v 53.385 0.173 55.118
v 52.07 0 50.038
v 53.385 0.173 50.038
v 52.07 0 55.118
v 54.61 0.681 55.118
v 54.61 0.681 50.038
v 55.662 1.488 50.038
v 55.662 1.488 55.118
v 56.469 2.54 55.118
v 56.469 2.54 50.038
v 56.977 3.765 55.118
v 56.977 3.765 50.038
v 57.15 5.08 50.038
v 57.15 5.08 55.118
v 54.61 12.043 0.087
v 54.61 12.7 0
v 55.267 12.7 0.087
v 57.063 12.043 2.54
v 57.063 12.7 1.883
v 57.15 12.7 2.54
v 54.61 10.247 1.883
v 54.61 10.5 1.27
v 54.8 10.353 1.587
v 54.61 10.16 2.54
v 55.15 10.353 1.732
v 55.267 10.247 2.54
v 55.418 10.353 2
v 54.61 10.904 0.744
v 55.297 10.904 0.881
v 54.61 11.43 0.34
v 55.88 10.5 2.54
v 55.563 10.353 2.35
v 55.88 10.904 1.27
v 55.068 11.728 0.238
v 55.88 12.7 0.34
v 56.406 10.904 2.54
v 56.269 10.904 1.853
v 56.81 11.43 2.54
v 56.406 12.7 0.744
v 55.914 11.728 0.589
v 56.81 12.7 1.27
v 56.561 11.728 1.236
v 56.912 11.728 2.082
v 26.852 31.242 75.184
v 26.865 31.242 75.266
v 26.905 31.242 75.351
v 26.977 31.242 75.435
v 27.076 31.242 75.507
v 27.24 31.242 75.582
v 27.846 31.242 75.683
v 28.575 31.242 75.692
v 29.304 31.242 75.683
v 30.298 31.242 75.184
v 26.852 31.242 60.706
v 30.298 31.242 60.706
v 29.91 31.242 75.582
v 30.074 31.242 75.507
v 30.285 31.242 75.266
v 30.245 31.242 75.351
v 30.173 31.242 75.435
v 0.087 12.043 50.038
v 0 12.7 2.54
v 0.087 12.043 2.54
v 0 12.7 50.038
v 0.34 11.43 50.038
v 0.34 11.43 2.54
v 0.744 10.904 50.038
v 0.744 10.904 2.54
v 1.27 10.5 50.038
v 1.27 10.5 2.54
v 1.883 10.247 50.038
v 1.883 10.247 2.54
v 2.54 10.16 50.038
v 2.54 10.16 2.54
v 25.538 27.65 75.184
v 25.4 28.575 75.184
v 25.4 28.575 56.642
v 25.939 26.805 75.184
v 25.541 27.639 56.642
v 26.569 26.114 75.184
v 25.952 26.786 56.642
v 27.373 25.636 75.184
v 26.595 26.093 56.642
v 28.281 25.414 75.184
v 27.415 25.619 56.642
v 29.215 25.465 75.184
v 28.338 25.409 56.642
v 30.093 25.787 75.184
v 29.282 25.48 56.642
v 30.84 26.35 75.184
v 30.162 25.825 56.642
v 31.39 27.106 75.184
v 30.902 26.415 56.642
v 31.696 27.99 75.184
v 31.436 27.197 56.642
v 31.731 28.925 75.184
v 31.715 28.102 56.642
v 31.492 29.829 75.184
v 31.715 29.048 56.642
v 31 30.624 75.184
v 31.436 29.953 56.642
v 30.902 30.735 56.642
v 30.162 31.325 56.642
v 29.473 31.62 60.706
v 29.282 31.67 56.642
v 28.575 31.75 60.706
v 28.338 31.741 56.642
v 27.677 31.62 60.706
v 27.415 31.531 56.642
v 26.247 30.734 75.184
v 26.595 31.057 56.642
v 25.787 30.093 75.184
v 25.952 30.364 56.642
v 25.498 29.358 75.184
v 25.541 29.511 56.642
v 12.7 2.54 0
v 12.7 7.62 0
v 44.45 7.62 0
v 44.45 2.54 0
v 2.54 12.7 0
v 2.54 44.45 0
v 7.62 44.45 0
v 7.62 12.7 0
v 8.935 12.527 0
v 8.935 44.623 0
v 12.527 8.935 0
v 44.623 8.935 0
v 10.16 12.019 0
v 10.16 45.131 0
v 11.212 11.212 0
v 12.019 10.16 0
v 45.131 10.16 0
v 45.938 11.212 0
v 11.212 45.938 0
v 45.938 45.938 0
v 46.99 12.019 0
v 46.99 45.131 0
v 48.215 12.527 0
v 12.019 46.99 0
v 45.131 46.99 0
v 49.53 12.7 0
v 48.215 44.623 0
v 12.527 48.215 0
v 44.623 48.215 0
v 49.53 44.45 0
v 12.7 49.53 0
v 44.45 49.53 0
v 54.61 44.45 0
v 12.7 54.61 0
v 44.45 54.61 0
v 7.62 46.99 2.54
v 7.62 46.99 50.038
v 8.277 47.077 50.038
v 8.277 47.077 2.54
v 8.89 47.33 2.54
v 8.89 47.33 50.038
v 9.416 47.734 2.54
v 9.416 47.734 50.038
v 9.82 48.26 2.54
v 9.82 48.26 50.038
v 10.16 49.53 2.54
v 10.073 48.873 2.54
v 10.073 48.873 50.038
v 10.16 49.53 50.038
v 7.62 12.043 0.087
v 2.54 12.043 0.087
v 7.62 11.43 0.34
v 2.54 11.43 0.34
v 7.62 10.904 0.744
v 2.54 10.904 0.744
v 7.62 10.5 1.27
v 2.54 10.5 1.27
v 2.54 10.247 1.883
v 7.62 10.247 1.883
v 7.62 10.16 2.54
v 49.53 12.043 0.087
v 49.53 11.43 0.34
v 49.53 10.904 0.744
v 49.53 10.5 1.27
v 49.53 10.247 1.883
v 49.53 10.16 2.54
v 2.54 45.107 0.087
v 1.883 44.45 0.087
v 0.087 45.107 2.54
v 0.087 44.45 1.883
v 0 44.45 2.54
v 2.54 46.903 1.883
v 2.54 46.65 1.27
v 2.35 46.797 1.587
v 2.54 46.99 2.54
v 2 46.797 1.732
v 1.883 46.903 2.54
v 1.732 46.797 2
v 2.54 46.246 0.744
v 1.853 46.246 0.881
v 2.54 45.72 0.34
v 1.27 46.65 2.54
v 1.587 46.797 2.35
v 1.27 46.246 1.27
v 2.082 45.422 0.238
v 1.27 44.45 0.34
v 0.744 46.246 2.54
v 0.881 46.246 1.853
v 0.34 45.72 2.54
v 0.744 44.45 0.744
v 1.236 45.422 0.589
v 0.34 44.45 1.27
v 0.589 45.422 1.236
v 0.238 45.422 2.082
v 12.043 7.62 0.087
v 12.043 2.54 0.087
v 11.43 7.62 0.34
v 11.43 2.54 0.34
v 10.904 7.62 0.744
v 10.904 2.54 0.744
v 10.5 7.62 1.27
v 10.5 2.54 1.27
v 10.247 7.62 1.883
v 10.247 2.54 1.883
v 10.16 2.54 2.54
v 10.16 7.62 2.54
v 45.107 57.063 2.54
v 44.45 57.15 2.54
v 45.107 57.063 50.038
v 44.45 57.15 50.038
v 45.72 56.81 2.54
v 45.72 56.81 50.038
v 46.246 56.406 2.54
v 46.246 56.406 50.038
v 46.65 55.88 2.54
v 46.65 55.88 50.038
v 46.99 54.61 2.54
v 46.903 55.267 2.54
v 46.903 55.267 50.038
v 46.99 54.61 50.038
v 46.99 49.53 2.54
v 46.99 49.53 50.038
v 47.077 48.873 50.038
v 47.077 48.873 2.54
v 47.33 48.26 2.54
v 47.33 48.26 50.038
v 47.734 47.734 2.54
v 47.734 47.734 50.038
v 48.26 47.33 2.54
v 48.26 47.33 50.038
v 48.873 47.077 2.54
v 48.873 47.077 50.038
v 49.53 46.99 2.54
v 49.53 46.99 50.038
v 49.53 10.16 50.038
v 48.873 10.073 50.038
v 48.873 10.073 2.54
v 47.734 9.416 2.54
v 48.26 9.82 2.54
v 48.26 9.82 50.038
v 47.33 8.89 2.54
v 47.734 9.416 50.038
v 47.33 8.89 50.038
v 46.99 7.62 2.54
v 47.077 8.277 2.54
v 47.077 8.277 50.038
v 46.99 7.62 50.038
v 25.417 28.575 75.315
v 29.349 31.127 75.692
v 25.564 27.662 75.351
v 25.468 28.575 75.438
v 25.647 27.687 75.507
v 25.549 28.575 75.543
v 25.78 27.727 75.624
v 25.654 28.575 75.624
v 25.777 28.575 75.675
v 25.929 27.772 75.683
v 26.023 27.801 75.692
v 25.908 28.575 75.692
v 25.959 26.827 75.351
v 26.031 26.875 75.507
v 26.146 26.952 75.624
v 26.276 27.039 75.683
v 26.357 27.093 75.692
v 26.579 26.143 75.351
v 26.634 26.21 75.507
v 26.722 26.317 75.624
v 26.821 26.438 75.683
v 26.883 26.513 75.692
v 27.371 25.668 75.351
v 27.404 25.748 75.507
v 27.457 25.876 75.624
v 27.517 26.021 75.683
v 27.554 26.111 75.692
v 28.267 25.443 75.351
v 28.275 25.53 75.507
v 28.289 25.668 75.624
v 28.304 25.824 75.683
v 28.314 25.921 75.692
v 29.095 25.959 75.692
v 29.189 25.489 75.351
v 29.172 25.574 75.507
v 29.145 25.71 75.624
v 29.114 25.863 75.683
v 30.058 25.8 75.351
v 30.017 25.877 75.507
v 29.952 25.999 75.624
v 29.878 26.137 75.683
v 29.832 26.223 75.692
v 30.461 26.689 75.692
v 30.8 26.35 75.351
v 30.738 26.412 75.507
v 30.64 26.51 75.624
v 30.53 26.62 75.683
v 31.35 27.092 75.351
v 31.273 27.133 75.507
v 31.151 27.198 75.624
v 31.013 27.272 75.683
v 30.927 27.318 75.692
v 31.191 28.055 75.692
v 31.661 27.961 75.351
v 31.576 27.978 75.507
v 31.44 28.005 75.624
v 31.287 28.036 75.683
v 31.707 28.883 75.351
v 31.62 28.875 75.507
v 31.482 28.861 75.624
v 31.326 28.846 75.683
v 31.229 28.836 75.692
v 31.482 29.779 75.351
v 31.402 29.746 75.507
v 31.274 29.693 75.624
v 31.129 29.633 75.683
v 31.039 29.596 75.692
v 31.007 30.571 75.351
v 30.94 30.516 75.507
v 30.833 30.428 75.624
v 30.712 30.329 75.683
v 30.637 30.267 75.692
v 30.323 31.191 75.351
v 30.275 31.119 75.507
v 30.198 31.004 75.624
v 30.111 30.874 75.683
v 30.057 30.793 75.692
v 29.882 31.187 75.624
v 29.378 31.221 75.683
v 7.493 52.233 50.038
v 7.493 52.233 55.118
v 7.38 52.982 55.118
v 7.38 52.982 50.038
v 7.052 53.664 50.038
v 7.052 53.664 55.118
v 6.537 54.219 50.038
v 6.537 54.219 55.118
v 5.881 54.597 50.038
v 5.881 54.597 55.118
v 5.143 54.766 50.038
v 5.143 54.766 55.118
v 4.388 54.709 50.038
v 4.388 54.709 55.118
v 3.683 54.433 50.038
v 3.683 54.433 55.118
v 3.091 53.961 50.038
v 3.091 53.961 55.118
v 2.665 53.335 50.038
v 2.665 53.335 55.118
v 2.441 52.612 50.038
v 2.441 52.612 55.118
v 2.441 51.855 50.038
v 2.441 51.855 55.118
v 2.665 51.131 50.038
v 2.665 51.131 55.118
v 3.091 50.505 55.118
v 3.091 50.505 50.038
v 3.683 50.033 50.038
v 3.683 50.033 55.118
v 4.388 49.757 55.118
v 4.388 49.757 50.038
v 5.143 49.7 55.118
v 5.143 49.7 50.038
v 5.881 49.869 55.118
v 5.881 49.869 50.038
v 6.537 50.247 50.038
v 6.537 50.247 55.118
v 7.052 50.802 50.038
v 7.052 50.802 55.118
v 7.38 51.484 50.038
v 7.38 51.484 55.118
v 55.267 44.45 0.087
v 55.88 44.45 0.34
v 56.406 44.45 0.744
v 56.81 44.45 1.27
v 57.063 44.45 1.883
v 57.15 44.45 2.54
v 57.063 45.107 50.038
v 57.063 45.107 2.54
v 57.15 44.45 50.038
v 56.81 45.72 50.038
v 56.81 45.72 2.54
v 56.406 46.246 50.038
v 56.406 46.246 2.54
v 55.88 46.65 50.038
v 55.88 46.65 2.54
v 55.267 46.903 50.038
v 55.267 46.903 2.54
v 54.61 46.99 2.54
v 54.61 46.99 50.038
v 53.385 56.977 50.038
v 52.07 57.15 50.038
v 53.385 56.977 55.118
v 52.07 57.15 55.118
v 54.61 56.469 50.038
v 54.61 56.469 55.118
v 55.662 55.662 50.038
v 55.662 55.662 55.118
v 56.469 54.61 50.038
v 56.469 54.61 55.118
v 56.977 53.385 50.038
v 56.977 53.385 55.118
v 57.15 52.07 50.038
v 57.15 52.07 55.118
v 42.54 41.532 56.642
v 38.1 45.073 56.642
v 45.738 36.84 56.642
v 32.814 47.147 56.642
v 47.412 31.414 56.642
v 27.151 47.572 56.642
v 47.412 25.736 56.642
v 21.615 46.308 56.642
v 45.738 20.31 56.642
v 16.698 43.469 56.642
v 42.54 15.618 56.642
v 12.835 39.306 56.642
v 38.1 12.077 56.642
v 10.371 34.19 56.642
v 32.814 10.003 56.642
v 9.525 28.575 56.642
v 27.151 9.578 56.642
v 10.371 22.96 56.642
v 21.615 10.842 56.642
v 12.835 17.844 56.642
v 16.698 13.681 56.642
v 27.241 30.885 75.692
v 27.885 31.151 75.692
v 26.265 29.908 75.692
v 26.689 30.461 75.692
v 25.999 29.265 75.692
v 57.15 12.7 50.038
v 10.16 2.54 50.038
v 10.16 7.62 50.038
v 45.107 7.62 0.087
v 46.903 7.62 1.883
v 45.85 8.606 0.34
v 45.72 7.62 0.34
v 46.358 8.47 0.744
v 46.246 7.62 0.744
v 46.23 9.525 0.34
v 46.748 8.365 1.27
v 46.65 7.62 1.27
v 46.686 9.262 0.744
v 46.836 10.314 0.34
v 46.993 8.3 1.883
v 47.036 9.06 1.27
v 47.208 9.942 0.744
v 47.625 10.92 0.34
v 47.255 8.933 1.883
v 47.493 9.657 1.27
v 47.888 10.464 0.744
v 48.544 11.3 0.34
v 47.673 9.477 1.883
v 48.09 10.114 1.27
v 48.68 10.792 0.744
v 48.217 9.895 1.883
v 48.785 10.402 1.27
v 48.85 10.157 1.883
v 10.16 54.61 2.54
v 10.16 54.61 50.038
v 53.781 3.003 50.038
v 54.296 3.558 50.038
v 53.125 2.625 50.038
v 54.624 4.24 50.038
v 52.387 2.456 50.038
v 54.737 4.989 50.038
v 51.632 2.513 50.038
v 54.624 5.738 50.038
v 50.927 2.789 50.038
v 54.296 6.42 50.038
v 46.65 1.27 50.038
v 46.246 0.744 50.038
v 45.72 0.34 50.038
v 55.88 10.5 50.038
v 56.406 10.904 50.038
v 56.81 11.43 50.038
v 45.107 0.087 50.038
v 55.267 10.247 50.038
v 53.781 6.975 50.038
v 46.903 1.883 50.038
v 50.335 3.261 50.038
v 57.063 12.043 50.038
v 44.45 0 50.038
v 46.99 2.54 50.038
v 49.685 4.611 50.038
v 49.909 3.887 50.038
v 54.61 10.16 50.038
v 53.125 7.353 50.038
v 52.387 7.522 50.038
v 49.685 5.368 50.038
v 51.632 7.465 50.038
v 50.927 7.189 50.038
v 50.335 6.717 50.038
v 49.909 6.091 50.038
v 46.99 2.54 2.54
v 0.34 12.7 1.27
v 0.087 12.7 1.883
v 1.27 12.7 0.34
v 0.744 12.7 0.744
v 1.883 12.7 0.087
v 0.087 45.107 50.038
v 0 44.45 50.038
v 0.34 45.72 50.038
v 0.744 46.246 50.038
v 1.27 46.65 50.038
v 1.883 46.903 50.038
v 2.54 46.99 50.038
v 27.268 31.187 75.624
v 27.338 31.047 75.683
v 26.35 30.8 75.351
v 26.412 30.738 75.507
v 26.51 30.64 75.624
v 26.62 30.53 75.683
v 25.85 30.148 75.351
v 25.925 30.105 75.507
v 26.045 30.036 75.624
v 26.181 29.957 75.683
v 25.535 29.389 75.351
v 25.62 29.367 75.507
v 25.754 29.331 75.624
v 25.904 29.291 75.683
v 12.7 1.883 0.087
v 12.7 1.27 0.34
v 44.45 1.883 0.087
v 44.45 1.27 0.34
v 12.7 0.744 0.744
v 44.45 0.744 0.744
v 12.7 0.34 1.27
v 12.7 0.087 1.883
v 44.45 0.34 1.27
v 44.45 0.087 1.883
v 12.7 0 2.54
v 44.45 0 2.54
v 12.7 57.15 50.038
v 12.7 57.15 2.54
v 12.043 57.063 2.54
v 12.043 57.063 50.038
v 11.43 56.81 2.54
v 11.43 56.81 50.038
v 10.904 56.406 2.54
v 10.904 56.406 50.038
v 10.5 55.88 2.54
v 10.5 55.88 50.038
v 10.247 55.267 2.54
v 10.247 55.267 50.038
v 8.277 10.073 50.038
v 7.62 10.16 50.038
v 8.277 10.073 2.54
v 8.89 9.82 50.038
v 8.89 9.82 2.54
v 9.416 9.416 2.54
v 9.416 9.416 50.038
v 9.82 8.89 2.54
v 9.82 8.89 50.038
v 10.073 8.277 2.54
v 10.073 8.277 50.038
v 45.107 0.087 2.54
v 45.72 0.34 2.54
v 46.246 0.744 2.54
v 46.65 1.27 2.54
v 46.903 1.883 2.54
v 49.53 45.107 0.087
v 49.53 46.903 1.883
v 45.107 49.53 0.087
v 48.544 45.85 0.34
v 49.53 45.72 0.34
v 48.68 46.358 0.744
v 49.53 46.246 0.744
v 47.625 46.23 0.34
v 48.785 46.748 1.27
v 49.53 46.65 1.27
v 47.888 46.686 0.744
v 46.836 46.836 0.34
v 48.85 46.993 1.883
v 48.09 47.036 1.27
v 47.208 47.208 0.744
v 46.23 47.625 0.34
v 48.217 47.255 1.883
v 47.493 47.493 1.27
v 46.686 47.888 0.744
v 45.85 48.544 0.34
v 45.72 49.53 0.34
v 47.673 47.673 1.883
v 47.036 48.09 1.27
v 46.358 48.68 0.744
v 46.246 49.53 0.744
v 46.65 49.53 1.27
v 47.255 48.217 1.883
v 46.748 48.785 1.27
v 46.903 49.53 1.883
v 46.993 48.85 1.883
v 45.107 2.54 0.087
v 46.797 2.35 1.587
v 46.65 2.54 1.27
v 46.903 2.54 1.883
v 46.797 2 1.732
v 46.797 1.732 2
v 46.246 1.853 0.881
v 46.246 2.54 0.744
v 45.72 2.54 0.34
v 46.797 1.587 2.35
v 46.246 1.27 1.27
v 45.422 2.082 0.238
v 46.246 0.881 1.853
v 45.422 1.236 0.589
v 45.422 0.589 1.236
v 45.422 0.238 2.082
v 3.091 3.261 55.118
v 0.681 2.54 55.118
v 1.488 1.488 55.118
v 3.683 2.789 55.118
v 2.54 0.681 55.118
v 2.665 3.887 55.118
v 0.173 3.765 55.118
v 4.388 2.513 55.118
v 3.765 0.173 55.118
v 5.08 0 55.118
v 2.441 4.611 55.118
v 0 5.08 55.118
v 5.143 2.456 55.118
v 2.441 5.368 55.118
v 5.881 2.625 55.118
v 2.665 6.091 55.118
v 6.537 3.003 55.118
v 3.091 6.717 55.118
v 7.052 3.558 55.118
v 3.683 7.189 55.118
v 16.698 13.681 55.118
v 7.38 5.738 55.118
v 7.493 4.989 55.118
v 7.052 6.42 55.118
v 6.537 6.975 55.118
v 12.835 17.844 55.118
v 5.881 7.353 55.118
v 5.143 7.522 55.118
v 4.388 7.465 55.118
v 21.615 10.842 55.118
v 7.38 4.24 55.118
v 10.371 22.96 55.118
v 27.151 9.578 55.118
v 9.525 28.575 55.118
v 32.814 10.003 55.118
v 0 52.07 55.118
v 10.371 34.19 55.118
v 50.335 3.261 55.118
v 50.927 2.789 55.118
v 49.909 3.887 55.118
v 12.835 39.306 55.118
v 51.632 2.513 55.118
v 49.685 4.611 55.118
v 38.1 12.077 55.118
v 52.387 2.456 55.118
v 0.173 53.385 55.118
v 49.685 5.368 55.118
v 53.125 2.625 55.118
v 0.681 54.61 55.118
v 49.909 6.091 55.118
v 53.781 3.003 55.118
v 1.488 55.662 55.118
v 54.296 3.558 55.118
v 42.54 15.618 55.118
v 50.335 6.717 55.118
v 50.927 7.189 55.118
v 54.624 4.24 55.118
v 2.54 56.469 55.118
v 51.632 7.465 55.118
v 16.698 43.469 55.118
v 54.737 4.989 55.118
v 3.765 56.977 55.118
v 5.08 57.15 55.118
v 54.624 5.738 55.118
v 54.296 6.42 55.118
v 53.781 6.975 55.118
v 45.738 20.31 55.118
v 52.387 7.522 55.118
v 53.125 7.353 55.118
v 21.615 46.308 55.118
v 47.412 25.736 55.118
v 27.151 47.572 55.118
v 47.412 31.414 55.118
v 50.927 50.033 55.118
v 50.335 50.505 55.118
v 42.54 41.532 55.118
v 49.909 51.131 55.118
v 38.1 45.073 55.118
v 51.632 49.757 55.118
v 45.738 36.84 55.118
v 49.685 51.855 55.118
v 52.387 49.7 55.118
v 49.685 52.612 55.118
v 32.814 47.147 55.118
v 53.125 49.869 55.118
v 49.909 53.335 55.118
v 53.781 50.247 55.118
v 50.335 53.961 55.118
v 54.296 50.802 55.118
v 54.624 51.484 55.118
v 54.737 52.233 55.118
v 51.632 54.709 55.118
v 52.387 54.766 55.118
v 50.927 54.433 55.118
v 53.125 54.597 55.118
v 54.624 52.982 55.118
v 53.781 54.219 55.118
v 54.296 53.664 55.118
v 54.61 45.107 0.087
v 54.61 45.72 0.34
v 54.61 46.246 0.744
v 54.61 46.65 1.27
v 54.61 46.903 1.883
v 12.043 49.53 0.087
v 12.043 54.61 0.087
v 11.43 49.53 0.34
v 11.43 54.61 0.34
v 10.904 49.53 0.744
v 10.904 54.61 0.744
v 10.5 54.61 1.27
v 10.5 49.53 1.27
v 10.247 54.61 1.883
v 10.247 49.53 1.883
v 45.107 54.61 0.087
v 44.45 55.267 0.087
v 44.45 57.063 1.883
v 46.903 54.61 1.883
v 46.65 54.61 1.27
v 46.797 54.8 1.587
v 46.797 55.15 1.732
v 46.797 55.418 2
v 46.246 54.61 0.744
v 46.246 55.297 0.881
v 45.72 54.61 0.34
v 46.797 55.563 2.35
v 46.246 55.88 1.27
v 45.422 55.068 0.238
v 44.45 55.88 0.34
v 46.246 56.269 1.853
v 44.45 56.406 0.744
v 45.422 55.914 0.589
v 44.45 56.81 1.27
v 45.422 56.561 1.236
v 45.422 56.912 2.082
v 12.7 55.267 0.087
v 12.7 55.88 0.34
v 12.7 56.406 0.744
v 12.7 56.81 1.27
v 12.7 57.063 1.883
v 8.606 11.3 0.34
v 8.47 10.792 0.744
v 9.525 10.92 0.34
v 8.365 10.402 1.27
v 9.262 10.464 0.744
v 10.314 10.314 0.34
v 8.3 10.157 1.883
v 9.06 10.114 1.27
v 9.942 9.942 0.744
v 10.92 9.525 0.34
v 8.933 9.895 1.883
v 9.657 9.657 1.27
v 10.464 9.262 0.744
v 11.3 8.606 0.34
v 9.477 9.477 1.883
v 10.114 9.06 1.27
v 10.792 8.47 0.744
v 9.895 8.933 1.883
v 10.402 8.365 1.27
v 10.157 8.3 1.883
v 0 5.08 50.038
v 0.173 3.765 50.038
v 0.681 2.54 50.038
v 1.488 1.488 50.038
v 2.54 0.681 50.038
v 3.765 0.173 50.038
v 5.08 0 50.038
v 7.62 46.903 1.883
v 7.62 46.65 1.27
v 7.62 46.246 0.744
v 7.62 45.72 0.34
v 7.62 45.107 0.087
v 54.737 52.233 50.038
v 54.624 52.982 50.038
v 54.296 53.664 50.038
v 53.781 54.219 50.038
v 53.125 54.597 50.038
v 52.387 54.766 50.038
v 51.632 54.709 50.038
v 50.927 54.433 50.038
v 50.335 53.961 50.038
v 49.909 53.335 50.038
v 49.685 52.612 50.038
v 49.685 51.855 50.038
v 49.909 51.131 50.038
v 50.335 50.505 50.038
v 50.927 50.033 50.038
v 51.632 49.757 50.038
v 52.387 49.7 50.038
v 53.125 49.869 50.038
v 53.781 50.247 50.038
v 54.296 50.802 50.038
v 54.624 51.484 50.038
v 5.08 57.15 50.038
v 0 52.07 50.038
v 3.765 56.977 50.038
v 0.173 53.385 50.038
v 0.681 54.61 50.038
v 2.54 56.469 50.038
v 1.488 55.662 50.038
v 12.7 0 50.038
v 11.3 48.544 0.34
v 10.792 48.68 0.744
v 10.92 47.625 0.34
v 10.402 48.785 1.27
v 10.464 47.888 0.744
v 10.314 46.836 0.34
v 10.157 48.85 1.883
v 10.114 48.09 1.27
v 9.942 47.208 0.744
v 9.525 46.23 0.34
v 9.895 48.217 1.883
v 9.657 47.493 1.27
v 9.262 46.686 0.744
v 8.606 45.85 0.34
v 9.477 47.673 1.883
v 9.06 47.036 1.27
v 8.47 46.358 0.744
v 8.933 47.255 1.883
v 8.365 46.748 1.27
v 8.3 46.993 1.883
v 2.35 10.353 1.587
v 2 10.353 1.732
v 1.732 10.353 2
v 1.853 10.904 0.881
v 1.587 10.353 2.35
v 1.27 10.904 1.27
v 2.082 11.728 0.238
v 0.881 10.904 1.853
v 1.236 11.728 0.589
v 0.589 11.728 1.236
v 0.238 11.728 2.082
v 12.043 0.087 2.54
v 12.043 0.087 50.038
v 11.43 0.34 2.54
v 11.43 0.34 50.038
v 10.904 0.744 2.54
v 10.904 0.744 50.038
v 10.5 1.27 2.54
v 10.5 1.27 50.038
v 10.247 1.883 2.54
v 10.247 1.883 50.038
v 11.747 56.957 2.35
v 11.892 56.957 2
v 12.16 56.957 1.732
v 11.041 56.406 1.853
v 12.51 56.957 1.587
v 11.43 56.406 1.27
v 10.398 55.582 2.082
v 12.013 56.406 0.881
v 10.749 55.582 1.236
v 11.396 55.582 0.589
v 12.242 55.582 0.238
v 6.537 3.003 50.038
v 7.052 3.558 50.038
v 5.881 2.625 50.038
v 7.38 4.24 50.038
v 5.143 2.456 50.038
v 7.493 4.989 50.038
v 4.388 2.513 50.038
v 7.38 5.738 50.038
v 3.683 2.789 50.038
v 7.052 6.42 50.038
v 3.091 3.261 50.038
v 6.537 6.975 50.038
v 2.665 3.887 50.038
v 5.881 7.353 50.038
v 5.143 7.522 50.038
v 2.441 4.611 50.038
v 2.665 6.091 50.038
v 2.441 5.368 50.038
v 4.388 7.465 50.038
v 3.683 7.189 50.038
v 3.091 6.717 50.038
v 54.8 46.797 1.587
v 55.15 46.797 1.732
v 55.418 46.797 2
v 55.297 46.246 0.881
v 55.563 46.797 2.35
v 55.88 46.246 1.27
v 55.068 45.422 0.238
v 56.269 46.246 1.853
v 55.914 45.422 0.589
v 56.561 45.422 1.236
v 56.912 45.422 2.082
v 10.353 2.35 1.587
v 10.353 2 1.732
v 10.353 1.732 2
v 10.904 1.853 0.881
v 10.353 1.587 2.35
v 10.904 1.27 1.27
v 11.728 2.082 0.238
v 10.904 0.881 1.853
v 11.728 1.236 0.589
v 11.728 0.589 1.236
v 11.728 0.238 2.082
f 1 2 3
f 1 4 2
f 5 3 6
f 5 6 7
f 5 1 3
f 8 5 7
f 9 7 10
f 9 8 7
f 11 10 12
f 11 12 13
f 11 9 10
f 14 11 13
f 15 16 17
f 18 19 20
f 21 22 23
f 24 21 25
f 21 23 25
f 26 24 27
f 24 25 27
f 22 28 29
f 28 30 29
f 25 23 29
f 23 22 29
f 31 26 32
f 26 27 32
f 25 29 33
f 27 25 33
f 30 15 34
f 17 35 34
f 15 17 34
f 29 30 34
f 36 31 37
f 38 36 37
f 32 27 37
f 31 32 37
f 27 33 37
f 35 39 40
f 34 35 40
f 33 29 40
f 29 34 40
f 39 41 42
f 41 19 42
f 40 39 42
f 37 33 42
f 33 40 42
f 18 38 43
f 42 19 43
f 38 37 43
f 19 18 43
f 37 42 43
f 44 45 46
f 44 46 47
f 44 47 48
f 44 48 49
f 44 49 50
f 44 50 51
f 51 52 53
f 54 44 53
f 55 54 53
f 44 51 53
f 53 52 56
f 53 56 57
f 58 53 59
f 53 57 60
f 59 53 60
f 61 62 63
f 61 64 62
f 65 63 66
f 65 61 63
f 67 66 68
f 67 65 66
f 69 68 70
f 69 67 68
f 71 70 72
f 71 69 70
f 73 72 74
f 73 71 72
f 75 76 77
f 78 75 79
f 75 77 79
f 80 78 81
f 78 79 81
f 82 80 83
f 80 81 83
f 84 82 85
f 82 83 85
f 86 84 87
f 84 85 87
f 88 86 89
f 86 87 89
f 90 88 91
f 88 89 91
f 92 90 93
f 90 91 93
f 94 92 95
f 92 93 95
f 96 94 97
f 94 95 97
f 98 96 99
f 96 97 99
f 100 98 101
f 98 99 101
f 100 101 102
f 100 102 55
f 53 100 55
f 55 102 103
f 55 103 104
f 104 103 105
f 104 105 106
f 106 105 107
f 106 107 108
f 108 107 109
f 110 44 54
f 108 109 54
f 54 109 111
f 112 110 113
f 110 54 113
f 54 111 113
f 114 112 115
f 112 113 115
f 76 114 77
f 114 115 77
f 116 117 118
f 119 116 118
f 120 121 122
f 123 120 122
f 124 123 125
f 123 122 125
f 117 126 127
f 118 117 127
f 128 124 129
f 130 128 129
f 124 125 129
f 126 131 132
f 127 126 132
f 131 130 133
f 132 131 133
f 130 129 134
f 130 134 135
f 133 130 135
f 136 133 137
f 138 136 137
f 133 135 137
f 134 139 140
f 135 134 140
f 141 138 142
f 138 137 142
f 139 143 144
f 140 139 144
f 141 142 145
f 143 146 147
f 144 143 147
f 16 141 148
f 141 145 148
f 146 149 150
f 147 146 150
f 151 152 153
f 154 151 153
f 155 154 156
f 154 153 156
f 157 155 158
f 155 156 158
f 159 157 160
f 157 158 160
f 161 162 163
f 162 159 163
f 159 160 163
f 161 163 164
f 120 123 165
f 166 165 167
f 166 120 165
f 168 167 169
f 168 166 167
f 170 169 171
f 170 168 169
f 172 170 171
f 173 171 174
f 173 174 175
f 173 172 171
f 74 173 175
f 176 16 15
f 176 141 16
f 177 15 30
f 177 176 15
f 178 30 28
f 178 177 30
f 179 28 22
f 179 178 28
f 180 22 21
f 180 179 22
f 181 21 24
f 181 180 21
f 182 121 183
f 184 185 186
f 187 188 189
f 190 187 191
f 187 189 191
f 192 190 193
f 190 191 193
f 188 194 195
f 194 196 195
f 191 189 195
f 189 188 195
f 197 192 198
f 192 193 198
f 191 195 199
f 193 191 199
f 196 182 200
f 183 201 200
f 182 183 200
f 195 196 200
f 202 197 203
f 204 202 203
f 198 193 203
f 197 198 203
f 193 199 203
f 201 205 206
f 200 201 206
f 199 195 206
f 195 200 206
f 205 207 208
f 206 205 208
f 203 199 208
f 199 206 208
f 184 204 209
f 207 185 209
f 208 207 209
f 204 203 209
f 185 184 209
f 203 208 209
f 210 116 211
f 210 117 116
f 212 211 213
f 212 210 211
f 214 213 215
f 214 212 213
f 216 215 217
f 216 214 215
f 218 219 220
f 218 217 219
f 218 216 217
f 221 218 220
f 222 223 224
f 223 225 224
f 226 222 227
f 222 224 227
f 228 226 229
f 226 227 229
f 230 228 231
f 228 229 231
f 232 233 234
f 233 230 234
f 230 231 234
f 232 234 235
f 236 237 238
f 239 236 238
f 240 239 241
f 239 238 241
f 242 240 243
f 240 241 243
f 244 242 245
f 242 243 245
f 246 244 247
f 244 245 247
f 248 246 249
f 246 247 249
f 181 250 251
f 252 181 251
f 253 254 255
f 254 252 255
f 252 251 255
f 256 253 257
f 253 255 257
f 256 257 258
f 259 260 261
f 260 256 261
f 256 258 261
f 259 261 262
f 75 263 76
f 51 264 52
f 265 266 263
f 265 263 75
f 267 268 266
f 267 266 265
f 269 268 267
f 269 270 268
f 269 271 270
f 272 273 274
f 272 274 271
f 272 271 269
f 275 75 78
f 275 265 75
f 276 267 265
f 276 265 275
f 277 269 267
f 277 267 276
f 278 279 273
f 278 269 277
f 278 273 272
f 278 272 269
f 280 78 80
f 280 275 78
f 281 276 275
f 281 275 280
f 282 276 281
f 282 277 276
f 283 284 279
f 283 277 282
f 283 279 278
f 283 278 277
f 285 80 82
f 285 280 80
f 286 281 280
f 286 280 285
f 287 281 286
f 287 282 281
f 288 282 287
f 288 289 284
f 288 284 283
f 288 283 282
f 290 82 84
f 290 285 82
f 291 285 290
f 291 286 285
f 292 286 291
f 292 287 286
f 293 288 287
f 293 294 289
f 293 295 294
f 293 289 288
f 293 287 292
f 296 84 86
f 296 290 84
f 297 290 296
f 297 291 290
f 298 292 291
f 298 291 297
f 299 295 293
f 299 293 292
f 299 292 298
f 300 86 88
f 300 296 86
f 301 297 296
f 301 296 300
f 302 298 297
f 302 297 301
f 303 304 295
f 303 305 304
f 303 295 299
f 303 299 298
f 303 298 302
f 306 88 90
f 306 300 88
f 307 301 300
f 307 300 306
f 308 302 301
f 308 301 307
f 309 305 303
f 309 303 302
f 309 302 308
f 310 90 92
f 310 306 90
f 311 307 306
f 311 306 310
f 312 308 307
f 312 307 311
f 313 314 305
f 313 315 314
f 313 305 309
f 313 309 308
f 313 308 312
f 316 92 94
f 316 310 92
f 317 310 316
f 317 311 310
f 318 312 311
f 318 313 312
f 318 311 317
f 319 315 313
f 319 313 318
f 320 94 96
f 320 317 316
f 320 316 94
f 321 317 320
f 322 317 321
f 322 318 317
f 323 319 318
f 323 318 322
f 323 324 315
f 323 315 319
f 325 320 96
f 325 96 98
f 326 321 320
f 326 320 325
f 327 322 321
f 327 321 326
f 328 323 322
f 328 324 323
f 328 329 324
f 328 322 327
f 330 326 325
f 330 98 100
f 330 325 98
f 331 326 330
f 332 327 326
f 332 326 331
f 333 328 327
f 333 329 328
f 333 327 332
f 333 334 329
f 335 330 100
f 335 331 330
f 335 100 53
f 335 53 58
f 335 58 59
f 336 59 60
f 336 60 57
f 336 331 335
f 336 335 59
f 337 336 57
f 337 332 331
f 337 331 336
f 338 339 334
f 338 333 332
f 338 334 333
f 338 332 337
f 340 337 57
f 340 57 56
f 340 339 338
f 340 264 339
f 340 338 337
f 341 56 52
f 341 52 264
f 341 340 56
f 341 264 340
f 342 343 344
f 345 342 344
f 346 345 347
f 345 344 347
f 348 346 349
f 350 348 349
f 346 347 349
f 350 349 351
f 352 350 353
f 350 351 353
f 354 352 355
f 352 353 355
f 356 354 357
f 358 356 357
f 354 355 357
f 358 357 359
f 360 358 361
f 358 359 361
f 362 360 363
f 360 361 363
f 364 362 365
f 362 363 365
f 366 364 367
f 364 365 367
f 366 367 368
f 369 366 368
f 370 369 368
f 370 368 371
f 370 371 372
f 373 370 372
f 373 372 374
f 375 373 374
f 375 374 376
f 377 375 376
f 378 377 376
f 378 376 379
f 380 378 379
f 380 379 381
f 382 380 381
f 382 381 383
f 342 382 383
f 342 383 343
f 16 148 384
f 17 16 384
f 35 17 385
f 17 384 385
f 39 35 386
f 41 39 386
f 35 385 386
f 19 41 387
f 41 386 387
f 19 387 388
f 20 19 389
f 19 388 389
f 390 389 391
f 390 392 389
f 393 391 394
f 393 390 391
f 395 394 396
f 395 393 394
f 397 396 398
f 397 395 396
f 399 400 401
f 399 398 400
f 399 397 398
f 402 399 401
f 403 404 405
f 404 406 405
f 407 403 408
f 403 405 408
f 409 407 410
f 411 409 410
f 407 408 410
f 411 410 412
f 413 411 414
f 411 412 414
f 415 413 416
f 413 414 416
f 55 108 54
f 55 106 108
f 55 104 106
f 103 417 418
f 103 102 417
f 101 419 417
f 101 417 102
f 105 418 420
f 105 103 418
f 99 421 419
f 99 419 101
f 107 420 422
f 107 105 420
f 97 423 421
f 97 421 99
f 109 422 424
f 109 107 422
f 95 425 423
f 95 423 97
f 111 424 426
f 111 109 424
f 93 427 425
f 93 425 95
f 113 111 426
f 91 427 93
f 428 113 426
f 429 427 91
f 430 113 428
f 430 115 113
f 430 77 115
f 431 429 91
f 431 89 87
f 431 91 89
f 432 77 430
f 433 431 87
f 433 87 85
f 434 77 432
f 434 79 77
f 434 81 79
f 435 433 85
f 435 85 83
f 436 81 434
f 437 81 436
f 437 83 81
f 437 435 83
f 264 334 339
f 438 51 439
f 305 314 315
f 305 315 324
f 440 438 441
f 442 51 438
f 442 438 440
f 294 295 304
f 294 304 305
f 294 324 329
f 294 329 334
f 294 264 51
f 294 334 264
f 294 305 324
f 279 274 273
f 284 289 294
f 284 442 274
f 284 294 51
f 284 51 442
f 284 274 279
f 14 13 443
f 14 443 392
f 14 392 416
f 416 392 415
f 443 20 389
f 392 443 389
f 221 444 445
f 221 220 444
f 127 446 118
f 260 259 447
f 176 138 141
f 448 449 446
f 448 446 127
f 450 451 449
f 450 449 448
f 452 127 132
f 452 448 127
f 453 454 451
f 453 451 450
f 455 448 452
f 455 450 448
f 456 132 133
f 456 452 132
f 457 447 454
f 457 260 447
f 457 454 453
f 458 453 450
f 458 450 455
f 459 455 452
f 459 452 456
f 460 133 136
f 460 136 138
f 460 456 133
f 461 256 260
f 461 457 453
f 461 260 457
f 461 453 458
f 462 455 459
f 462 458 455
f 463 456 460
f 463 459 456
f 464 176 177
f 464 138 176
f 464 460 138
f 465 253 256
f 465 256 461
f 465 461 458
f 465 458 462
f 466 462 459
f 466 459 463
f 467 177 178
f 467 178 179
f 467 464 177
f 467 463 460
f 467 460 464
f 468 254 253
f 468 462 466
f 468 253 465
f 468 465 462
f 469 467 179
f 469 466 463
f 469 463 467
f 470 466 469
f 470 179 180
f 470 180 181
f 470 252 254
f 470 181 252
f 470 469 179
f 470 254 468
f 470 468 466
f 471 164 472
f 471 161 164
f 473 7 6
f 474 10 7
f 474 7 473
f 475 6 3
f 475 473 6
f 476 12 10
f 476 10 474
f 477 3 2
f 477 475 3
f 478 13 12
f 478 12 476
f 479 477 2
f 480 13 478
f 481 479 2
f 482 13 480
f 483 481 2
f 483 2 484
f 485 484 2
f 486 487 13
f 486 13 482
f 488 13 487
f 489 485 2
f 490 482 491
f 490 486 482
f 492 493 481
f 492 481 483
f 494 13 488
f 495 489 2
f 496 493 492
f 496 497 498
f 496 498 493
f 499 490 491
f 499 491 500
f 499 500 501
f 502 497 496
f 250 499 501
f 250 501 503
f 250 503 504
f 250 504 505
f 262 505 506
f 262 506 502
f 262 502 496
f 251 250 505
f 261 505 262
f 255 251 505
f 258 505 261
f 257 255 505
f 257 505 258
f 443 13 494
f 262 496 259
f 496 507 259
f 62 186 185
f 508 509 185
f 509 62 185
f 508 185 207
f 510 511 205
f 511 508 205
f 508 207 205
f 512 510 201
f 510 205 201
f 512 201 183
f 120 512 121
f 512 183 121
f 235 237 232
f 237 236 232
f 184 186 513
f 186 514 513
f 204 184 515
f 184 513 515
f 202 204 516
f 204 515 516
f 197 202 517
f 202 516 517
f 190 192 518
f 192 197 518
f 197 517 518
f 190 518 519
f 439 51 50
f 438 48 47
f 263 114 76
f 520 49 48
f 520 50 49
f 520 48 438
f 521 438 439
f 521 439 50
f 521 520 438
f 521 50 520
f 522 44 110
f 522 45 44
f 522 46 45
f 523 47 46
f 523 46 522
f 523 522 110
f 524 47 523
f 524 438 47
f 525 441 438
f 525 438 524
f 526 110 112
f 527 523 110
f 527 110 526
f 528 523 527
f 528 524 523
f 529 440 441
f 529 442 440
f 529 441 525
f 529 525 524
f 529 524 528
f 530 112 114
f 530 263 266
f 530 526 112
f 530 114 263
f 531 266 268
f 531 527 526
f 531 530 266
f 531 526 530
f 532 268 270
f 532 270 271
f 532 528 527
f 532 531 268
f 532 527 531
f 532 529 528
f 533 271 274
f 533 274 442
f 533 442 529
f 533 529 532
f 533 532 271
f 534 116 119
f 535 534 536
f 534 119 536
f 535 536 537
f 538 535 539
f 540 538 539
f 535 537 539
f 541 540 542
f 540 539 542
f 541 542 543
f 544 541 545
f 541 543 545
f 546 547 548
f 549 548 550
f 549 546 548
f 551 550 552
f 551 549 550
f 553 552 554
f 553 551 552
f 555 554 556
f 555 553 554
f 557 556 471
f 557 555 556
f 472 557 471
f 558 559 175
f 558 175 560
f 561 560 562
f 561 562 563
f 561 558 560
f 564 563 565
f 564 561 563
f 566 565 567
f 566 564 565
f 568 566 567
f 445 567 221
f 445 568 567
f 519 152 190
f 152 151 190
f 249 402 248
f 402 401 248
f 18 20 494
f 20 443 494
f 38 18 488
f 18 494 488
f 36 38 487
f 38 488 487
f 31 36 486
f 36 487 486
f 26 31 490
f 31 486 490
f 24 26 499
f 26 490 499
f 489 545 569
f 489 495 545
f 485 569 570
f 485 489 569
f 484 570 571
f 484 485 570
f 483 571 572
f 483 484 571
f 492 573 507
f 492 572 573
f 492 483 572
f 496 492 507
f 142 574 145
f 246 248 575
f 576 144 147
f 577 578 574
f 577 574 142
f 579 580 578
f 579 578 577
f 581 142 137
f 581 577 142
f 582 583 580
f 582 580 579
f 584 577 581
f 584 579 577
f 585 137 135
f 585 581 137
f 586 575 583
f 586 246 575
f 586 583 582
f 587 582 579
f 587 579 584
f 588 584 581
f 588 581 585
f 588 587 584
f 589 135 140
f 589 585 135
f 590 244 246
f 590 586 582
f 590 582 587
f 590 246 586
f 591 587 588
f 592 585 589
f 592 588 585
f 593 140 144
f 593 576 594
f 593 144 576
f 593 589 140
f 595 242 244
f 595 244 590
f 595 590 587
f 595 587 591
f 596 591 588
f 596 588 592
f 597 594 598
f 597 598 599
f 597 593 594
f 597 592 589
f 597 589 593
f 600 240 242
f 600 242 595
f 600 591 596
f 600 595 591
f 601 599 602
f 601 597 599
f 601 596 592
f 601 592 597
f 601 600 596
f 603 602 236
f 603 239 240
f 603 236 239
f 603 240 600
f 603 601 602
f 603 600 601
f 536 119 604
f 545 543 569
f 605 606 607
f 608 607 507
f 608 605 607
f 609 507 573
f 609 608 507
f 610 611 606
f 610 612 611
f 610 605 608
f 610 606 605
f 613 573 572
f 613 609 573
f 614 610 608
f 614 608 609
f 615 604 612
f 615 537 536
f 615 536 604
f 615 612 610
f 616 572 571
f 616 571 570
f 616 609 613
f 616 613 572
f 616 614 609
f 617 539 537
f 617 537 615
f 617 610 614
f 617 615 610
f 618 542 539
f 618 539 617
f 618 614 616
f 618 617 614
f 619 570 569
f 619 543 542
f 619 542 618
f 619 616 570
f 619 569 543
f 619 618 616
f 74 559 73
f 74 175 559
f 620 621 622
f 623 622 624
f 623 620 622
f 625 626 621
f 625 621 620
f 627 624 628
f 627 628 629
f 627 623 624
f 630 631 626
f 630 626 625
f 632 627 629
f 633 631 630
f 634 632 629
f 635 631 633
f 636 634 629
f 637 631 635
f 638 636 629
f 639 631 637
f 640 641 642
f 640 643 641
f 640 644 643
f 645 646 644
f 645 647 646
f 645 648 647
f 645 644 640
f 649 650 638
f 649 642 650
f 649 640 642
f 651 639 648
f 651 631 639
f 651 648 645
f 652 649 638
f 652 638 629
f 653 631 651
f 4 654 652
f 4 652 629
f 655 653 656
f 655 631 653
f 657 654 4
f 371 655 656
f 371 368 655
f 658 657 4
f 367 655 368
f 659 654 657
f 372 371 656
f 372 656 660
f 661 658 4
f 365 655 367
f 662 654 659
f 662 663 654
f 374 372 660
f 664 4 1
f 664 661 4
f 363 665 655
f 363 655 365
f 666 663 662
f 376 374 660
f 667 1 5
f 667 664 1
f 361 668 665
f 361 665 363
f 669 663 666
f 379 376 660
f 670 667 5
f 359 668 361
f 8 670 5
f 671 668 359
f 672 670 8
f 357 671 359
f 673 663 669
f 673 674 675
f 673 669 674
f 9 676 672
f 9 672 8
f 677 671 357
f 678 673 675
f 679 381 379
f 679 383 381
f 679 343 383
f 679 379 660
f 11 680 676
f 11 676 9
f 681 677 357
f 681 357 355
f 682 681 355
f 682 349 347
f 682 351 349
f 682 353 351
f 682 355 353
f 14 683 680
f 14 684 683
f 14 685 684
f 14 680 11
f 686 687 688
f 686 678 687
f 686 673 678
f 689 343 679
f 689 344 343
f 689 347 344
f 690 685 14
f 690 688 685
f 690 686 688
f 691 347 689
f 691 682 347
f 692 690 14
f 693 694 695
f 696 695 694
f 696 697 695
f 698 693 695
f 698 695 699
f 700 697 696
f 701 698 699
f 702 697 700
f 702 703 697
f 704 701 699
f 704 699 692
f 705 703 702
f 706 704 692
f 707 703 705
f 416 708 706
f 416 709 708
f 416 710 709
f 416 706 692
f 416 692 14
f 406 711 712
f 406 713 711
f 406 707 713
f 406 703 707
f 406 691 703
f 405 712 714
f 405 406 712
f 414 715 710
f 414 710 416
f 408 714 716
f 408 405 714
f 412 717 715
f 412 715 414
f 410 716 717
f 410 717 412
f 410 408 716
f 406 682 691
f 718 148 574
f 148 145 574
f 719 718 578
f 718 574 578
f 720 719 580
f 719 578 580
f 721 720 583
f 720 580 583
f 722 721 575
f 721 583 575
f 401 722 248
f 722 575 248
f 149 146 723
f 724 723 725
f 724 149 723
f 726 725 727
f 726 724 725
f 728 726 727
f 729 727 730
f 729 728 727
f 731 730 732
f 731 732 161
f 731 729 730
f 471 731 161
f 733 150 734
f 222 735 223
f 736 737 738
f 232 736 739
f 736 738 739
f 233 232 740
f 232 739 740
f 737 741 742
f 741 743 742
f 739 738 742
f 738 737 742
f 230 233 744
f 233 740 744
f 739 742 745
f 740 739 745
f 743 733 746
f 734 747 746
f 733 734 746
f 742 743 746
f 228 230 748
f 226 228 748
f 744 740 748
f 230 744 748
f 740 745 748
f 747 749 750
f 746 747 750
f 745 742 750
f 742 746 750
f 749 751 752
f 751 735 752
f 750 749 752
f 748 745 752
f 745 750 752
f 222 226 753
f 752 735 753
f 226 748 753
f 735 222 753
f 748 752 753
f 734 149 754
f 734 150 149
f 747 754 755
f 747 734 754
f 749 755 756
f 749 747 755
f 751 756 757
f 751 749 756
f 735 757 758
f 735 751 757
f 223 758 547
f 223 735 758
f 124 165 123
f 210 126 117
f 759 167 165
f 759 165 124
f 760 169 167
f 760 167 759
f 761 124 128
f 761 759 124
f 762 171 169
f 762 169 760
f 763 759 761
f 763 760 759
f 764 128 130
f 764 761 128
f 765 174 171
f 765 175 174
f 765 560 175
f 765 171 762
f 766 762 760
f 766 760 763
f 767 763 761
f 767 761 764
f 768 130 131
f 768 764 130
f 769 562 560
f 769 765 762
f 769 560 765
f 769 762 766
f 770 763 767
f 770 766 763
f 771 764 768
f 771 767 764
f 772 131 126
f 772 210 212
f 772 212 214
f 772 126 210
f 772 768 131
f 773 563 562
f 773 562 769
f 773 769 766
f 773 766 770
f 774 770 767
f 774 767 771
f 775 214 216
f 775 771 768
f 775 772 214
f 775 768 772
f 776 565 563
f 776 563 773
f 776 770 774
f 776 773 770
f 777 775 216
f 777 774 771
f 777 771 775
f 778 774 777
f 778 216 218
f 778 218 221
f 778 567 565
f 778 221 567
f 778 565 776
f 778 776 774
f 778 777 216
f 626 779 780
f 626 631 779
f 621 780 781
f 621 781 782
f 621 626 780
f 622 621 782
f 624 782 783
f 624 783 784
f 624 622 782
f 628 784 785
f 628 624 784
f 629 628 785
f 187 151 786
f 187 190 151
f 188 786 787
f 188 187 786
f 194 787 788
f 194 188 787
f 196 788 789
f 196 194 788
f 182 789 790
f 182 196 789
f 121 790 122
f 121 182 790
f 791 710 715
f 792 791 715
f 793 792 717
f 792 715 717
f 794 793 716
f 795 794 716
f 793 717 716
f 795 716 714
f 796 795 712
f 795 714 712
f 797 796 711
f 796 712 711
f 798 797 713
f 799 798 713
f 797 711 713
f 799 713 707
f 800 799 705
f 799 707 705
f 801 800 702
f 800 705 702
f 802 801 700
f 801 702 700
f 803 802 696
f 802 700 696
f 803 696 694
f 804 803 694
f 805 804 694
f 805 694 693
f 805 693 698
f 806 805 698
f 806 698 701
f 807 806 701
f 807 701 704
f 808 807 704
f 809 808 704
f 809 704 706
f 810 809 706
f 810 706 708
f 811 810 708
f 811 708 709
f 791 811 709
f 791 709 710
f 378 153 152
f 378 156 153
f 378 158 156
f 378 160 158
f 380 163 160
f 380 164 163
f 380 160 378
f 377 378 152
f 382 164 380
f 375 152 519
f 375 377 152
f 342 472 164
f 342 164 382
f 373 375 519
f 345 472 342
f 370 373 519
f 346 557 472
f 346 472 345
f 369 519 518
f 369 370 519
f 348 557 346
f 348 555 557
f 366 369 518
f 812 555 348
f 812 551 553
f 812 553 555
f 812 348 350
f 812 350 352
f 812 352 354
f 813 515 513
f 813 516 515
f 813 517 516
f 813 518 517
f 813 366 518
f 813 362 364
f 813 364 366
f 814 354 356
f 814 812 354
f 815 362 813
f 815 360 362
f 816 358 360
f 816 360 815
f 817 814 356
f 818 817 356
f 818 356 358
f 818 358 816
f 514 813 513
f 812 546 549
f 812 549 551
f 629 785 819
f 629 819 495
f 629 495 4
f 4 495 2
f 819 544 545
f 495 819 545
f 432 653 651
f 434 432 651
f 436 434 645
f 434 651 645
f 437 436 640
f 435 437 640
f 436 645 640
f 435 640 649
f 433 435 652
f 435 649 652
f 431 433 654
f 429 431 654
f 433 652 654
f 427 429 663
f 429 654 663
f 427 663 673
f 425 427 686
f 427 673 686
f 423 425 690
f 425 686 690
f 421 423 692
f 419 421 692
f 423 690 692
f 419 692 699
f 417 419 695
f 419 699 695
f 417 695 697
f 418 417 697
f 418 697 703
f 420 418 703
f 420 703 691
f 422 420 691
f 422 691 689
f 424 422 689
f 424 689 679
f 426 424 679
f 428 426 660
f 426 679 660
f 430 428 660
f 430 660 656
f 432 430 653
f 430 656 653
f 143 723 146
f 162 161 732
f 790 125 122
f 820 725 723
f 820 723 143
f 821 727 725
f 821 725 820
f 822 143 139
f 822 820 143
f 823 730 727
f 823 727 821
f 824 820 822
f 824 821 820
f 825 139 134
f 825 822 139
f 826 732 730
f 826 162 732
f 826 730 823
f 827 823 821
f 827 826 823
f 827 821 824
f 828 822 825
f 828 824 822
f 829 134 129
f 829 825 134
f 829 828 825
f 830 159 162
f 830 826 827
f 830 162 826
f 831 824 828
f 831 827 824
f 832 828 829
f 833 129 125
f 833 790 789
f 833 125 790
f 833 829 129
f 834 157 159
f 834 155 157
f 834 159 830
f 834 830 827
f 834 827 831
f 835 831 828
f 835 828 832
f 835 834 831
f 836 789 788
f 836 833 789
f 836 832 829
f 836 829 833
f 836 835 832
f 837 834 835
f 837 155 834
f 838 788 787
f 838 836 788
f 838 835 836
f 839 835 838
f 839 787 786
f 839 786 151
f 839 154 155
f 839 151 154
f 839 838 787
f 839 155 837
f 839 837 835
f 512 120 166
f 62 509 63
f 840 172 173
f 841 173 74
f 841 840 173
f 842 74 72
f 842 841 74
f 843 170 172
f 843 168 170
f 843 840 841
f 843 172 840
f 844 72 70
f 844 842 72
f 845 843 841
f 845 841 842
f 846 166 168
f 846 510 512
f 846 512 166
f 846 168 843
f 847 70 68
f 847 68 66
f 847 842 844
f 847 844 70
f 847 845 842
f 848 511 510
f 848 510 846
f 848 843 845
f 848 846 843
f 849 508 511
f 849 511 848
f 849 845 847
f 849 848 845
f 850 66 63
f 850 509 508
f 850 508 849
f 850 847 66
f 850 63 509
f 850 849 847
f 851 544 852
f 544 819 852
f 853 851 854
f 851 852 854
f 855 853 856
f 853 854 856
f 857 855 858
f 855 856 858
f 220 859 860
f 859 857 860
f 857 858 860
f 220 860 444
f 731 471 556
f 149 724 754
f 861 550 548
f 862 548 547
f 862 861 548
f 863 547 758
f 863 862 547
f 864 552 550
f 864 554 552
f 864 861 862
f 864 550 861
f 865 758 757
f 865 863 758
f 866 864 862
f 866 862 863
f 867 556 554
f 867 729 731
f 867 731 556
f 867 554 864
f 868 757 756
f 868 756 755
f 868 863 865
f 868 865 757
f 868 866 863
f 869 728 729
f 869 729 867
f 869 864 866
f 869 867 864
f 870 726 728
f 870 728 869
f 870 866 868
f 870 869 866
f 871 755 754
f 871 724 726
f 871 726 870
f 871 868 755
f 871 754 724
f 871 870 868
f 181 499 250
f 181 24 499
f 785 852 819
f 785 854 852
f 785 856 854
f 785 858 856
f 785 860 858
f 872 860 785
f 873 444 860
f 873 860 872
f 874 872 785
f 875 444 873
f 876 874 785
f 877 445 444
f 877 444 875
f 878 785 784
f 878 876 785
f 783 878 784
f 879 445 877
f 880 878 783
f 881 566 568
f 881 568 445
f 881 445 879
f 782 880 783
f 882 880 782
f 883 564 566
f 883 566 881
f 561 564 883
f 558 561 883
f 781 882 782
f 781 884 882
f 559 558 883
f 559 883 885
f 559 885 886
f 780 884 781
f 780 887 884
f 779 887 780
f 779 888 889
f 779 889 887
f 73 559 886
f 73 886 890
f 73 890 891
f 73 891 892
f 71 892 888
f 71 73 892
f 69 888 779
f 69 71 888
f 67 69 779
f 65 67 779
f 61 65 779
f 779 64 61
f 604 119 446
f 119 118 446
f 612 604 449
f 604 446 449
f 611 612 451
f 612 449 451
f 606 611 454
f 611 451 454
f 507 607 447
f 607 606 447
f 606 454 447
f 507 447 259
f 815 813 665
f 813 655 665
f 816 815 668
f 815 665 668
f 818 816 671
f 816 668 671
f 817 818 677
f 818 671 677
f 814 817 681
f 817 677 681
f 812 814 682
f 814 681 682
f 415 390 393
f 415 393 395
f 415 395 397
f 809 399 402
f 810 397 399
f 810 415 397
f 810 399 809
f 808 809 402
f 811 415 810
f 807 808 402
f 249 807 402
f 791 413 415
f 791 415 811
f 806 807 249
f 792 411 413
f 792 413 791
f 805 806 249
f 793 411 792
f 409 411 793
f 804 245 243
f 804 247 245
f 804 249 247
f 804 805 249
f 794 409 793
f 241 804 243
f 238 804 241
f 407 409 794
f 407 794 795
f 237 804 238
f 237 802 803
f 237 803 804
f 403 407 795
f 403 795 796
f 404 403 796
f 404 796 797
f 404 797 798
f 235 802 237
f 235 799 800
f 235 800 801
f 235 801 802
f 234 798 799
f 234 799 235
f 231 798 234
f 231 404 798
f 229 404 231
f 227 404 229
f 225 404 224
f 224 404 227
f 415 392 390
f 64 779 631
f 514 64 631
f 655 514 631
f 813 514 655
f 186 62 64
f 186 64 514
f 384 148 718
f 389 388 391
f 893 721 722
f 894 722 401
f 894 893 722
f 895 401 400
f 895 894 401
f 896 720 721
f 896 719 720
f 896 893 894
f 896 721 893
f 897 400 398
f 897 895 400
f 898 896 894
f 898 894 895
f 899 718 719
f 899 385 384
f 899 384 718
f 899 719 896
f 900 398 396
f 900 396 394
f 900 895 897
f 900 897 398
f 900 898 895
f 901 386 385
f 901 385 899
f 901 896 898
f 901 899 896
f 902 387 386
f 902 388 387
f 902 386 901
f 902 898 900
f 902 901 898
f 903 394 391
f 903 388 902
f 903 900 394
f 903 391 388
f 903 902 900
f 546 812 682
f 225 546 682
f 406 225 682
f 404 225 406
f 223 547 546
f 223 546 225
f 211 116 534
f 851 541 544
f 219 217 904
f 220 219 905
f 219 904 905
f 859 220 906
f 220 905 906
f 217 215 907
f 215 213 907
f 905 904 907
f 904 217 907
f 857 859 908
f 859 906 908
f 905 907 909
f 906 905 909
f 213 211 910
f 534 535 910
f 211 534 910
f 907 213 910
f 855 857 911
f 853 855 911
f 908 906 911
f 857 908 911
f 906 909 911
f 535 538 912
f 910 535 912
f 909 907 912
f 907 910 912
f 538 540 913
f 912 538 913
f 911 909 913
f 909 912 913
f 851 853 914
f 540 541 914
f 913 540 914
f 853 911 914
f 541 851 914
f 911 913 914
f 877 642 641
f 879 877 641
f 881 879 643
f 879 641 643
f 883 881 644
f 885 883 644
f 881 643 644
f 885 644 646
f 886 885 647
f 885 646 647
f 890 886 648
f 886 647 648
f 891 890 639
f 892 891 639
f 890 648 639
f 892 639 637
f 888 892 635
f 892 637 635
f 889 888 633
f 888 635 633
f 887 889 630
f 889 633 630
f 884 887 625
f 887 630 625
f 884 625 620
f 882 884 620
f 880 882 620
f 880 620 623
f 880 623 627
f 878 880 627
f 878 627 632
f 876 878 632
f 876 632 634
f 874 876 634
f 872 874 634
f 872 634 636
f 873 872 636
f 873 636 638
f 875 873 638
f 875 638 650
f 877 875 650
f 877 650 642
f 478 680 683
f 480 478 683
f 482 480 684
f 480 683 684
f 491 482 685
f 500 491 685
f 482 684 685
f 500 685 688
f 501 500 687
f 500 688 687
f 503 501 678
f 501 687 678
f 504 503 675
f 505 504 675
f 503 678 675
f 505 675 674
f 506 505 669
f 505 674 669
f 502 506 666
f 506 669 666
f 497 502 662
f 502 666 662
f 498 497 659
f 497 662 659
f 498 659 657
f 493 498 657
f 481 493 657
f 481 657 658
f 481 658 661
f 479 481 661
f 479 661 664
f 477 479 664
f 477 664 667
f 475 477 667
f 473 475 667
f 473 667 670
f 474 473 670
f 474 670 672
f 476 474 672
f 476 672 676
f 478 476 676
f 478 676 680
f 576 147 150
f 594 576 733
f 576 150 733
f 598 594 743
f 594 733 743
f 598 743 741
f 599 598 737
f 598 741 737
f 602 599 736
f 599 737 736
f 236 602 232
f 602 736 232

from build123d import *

# Parameters (mm, degrees)
SKETCH1_W           = 57.15
SKETCH1_H           = 57.15
BOSS_EXTRUDE1_DEPTH = 55.118
SKETCH2_R           = 19.05
BOSS_EXTRUDE2_DEPTH = 1.524
SKETCH3_R           = 3.175
BOSS_EXTRUDE3_DEPTH = 19.05
SKETCH18_W          = 20.32
SKETCH18_H          = 20.32
CUT_EXTRUDE13_DEPTH = 50.038
SKETCH20_W          = 20.32
SKETCH20_H          = 20.32
CUT_EXTRUDE14_DEPTH = 50.038
SKETCH21_W          = 20.32
SKETCH21_H          = 20.32
CUT_EXTRUDE15_DEPTH = 50.038
SKETCH22_W          = 20.32
SKETCH22_H          = 20.32
CUT_EXTRUDE16_DEPTH = 50.038
SKETCH11_R          = 2.54
CUT_EXTRUDE8_DEPTH  = 98.827597967
SKETCH12_R          = 2.54
CUT_EXTRUDE9_DEPTH  = 98.827597967
SKETCH14_R          = 2.54
CUT_EXTRUDE10_DEPTH = 98.827597967
SKETCH15_R          = 2.54
CUT_EXTRUDE11_DEPTH = 98.827597967
FILLET2_R           = 5.08
FILLET4_R           = 2.54
FILLET1_R           = 0.508
SKETCH10_W          = 7.148953117
SKETCH10_H          = 1.106198654
CUT_EXTRUDE7_DEPTH  = 14.986


with BuildPart() as part:
    # Sketch1 → Boss-Extrude1 (new body)
    with BuildSketch(Plane.XY):
        with Locations((28.575, 28.575)):
            Rectangle(SKETCH1_W, SKETCH1_H)
    extrude(amount=BOSS_EXTRUDE1_DEPTH)

    # Sketch2 → Boss-Extrude2 (add)
    with BuildSketch(Plane.XY.offset(55.118)):
        with Locations(Location((28.575, 28.575, 0), (0, 0, 180))):
            Circle(SKETCH2_R)
    extrude(amount=BOSS_EXTRUDE2_DEPTH)

    # Sketch3 → Boss-Extrude3 (add)
    with BuildSketch(Plane.XY.offset(56.642)):
        with Locations(Location((28.575, 28.575, 0), (0, 0, 180))):
            Circle(SKETCH3_R)
    extrude(amount=BOSS_EXTRUDE3_DEPTH)

    # Sketch18 → Cut-Extrude13 (cut)
    with BuildSketch(Plane(origin=(0, 0, 0), x_dir=(-1, 0, 0), z_dir=(0, 0, -1))):
        with Locations((0, 57.15)):
            Rectangle(SKETCH18_W, SKETCH18_H)
    extrude(amount=-CUT_EXTRUDE13_DEPTH, mode=Mode.SUBTRACT)

    # Sketch20 → Cut-Extrude14 (cut)
    with BuildSketch(Plane(origin=(0, 0, 0), x_dir=(-1, 0, 0), z_dir=(0, 0, -1))):
        Rectangle(SKETCH20_W, SKETCH20_H)
    extrude(amount=-CUT_EXTRUDE14_DEPTH, mode=Mode.SUBTRACT)

    # Sketch21 → Cut-Extrude15 (cut)
    with BuildSketch(Plane(origin=(0, 0, 0), x_dir=(-1, 0, 0), z_dir=(0, 0, -1))):
        with Locations((-57.15, 0)):
            Rectangle(SKETCH21_W, SKETCH21_H)
    extrude(amount=-CUT_EXTRUDE15_DEPTH, mode=Mode.SUBTRACT)

    # Sketch22 → Cut-Extrude16 (cut)
    with BuildSketch(Plane(origin=(0, 0, 0), x_dir=(-1, 0, 0), z_dir=(0, 0, -1))):
        with Locations((-57.15, 57.15)):
            Rectangle(SKETCH22_W, SKETCH22_H)
    extrude(amount=-CUT_EXTRUDE16_DEPTH, mode=Mode.SUBTRACT)

    # Sketch11 → Cut-Extrude8 (cut, through all)
    with BuildSketch(Plane.XY.offset(55.118)):
        with Locations((4.953, 52.233071325)):
            Circle(SKETCH11_R)
    extrude(amount=-CUT_EXTRUDE8_DEPTH, mode=Mode.SUBTRACT)

    # Sketch12 → Cut-Extrude9 (cut, through all)
    with BuildSketch(Plane.XY.offset(55.118)):
        with Locations((52.197, 52.233071325)):
            Circle(SKETCH12_R)
    extrude(amount=-CUT_EXTRUDE9_DEPTH, mode=Mode.SUBTRACT)

    # Sketch14 → Cut-Extrude10 (cut, through all)
    with BuildSketch(Plane.XY.offset(55.118)):
        with Locations((4.953, 4.989071325)):
            Circle(SKETCH14_R)
    extrude(amount=-CUT_EXTRUDE10_DEPTH, mode=Mode.SUBTRACT)

    # Sketch15 → Cut-Extrude11 (cut, through all)
    with BuildSketch(Plane.XY.offset(55.118)):
        with Locations((52.197, 4.989071325)):
            Circle(SKETCH15_R)
    extrude(amount=-CUT_EXTRUDE11_DEPTH, mode=Mode.SUBTRACT)

    # Fillet2
    fillet2_edges = [part.edges().sort_by_distance(p)[0] for p in [
        (0, 57.15, 52.578),
        (57.15, 57.15, 52.578),
        (57.15, 0, 52.578),
        (0, 0, 52.578),
    ]]
    fillet(fillet2_edges, radius=FILLET2_R)

    # Fillet4
    fillet4_edges = [part.edges().sort_by_distance(p)[0] for p in [
        (0, 28.575, 0),
        (10.16, 52.07, 0),
        (5.08, 46.99, 0),
        (0, 46.99, 25.019),
        (10.16, 57.15, 25.019),
        (10.16, 46.99, 25.019),
        (28.575, 0, 0),
        (5.08, 10.16, 0),
        (10.16, 5.08, 0),
        (10.16, 0, 25.019),
        (0, 10.16, 25.019),
        (10.16, 10.16, 25.019),
        (57.15, 28.575, 0),
        (46.99, 5.08, 0),
        (52.07, 10.16, 0),
        (57.15, 10.16, 25.019),
        (46.99, 0, 25.019),
        (46.99, 10.16, 25.019),
        (28.575, 57.15, 0),
        (52.07, 46.99, 0),
        (46.99, 52.07, 0),
        (46.99, 57.15, 25.019),
        (57.15, 46.99, 25.019),
        (46.99, 46.99, 25.019),
    ]]
    fillet(fillet4_edges, radius=FILLET4_R)

    # Fillet1
    fillet1_edges = [part.edges().sort_by_distance(p)[0] for p in [
        (31.75, 28.575, 75.692),
    ]]
    fillet(fillet1_edges, radius=FILLET1_R)

    # Sketch10 → Cut-Extrude7 (cut)
    with BuildSketch(Plane.XY.offset(75.692)):
        with Locations((29.031069878, 31.795099327)):
            Rectangle(SKETCH10_W, SKETCH10_H)
    extrude(amount=-CUT_EXTRUDE7_DEPTH, mode=Mode.SUBTRACT)


solid = part.part
